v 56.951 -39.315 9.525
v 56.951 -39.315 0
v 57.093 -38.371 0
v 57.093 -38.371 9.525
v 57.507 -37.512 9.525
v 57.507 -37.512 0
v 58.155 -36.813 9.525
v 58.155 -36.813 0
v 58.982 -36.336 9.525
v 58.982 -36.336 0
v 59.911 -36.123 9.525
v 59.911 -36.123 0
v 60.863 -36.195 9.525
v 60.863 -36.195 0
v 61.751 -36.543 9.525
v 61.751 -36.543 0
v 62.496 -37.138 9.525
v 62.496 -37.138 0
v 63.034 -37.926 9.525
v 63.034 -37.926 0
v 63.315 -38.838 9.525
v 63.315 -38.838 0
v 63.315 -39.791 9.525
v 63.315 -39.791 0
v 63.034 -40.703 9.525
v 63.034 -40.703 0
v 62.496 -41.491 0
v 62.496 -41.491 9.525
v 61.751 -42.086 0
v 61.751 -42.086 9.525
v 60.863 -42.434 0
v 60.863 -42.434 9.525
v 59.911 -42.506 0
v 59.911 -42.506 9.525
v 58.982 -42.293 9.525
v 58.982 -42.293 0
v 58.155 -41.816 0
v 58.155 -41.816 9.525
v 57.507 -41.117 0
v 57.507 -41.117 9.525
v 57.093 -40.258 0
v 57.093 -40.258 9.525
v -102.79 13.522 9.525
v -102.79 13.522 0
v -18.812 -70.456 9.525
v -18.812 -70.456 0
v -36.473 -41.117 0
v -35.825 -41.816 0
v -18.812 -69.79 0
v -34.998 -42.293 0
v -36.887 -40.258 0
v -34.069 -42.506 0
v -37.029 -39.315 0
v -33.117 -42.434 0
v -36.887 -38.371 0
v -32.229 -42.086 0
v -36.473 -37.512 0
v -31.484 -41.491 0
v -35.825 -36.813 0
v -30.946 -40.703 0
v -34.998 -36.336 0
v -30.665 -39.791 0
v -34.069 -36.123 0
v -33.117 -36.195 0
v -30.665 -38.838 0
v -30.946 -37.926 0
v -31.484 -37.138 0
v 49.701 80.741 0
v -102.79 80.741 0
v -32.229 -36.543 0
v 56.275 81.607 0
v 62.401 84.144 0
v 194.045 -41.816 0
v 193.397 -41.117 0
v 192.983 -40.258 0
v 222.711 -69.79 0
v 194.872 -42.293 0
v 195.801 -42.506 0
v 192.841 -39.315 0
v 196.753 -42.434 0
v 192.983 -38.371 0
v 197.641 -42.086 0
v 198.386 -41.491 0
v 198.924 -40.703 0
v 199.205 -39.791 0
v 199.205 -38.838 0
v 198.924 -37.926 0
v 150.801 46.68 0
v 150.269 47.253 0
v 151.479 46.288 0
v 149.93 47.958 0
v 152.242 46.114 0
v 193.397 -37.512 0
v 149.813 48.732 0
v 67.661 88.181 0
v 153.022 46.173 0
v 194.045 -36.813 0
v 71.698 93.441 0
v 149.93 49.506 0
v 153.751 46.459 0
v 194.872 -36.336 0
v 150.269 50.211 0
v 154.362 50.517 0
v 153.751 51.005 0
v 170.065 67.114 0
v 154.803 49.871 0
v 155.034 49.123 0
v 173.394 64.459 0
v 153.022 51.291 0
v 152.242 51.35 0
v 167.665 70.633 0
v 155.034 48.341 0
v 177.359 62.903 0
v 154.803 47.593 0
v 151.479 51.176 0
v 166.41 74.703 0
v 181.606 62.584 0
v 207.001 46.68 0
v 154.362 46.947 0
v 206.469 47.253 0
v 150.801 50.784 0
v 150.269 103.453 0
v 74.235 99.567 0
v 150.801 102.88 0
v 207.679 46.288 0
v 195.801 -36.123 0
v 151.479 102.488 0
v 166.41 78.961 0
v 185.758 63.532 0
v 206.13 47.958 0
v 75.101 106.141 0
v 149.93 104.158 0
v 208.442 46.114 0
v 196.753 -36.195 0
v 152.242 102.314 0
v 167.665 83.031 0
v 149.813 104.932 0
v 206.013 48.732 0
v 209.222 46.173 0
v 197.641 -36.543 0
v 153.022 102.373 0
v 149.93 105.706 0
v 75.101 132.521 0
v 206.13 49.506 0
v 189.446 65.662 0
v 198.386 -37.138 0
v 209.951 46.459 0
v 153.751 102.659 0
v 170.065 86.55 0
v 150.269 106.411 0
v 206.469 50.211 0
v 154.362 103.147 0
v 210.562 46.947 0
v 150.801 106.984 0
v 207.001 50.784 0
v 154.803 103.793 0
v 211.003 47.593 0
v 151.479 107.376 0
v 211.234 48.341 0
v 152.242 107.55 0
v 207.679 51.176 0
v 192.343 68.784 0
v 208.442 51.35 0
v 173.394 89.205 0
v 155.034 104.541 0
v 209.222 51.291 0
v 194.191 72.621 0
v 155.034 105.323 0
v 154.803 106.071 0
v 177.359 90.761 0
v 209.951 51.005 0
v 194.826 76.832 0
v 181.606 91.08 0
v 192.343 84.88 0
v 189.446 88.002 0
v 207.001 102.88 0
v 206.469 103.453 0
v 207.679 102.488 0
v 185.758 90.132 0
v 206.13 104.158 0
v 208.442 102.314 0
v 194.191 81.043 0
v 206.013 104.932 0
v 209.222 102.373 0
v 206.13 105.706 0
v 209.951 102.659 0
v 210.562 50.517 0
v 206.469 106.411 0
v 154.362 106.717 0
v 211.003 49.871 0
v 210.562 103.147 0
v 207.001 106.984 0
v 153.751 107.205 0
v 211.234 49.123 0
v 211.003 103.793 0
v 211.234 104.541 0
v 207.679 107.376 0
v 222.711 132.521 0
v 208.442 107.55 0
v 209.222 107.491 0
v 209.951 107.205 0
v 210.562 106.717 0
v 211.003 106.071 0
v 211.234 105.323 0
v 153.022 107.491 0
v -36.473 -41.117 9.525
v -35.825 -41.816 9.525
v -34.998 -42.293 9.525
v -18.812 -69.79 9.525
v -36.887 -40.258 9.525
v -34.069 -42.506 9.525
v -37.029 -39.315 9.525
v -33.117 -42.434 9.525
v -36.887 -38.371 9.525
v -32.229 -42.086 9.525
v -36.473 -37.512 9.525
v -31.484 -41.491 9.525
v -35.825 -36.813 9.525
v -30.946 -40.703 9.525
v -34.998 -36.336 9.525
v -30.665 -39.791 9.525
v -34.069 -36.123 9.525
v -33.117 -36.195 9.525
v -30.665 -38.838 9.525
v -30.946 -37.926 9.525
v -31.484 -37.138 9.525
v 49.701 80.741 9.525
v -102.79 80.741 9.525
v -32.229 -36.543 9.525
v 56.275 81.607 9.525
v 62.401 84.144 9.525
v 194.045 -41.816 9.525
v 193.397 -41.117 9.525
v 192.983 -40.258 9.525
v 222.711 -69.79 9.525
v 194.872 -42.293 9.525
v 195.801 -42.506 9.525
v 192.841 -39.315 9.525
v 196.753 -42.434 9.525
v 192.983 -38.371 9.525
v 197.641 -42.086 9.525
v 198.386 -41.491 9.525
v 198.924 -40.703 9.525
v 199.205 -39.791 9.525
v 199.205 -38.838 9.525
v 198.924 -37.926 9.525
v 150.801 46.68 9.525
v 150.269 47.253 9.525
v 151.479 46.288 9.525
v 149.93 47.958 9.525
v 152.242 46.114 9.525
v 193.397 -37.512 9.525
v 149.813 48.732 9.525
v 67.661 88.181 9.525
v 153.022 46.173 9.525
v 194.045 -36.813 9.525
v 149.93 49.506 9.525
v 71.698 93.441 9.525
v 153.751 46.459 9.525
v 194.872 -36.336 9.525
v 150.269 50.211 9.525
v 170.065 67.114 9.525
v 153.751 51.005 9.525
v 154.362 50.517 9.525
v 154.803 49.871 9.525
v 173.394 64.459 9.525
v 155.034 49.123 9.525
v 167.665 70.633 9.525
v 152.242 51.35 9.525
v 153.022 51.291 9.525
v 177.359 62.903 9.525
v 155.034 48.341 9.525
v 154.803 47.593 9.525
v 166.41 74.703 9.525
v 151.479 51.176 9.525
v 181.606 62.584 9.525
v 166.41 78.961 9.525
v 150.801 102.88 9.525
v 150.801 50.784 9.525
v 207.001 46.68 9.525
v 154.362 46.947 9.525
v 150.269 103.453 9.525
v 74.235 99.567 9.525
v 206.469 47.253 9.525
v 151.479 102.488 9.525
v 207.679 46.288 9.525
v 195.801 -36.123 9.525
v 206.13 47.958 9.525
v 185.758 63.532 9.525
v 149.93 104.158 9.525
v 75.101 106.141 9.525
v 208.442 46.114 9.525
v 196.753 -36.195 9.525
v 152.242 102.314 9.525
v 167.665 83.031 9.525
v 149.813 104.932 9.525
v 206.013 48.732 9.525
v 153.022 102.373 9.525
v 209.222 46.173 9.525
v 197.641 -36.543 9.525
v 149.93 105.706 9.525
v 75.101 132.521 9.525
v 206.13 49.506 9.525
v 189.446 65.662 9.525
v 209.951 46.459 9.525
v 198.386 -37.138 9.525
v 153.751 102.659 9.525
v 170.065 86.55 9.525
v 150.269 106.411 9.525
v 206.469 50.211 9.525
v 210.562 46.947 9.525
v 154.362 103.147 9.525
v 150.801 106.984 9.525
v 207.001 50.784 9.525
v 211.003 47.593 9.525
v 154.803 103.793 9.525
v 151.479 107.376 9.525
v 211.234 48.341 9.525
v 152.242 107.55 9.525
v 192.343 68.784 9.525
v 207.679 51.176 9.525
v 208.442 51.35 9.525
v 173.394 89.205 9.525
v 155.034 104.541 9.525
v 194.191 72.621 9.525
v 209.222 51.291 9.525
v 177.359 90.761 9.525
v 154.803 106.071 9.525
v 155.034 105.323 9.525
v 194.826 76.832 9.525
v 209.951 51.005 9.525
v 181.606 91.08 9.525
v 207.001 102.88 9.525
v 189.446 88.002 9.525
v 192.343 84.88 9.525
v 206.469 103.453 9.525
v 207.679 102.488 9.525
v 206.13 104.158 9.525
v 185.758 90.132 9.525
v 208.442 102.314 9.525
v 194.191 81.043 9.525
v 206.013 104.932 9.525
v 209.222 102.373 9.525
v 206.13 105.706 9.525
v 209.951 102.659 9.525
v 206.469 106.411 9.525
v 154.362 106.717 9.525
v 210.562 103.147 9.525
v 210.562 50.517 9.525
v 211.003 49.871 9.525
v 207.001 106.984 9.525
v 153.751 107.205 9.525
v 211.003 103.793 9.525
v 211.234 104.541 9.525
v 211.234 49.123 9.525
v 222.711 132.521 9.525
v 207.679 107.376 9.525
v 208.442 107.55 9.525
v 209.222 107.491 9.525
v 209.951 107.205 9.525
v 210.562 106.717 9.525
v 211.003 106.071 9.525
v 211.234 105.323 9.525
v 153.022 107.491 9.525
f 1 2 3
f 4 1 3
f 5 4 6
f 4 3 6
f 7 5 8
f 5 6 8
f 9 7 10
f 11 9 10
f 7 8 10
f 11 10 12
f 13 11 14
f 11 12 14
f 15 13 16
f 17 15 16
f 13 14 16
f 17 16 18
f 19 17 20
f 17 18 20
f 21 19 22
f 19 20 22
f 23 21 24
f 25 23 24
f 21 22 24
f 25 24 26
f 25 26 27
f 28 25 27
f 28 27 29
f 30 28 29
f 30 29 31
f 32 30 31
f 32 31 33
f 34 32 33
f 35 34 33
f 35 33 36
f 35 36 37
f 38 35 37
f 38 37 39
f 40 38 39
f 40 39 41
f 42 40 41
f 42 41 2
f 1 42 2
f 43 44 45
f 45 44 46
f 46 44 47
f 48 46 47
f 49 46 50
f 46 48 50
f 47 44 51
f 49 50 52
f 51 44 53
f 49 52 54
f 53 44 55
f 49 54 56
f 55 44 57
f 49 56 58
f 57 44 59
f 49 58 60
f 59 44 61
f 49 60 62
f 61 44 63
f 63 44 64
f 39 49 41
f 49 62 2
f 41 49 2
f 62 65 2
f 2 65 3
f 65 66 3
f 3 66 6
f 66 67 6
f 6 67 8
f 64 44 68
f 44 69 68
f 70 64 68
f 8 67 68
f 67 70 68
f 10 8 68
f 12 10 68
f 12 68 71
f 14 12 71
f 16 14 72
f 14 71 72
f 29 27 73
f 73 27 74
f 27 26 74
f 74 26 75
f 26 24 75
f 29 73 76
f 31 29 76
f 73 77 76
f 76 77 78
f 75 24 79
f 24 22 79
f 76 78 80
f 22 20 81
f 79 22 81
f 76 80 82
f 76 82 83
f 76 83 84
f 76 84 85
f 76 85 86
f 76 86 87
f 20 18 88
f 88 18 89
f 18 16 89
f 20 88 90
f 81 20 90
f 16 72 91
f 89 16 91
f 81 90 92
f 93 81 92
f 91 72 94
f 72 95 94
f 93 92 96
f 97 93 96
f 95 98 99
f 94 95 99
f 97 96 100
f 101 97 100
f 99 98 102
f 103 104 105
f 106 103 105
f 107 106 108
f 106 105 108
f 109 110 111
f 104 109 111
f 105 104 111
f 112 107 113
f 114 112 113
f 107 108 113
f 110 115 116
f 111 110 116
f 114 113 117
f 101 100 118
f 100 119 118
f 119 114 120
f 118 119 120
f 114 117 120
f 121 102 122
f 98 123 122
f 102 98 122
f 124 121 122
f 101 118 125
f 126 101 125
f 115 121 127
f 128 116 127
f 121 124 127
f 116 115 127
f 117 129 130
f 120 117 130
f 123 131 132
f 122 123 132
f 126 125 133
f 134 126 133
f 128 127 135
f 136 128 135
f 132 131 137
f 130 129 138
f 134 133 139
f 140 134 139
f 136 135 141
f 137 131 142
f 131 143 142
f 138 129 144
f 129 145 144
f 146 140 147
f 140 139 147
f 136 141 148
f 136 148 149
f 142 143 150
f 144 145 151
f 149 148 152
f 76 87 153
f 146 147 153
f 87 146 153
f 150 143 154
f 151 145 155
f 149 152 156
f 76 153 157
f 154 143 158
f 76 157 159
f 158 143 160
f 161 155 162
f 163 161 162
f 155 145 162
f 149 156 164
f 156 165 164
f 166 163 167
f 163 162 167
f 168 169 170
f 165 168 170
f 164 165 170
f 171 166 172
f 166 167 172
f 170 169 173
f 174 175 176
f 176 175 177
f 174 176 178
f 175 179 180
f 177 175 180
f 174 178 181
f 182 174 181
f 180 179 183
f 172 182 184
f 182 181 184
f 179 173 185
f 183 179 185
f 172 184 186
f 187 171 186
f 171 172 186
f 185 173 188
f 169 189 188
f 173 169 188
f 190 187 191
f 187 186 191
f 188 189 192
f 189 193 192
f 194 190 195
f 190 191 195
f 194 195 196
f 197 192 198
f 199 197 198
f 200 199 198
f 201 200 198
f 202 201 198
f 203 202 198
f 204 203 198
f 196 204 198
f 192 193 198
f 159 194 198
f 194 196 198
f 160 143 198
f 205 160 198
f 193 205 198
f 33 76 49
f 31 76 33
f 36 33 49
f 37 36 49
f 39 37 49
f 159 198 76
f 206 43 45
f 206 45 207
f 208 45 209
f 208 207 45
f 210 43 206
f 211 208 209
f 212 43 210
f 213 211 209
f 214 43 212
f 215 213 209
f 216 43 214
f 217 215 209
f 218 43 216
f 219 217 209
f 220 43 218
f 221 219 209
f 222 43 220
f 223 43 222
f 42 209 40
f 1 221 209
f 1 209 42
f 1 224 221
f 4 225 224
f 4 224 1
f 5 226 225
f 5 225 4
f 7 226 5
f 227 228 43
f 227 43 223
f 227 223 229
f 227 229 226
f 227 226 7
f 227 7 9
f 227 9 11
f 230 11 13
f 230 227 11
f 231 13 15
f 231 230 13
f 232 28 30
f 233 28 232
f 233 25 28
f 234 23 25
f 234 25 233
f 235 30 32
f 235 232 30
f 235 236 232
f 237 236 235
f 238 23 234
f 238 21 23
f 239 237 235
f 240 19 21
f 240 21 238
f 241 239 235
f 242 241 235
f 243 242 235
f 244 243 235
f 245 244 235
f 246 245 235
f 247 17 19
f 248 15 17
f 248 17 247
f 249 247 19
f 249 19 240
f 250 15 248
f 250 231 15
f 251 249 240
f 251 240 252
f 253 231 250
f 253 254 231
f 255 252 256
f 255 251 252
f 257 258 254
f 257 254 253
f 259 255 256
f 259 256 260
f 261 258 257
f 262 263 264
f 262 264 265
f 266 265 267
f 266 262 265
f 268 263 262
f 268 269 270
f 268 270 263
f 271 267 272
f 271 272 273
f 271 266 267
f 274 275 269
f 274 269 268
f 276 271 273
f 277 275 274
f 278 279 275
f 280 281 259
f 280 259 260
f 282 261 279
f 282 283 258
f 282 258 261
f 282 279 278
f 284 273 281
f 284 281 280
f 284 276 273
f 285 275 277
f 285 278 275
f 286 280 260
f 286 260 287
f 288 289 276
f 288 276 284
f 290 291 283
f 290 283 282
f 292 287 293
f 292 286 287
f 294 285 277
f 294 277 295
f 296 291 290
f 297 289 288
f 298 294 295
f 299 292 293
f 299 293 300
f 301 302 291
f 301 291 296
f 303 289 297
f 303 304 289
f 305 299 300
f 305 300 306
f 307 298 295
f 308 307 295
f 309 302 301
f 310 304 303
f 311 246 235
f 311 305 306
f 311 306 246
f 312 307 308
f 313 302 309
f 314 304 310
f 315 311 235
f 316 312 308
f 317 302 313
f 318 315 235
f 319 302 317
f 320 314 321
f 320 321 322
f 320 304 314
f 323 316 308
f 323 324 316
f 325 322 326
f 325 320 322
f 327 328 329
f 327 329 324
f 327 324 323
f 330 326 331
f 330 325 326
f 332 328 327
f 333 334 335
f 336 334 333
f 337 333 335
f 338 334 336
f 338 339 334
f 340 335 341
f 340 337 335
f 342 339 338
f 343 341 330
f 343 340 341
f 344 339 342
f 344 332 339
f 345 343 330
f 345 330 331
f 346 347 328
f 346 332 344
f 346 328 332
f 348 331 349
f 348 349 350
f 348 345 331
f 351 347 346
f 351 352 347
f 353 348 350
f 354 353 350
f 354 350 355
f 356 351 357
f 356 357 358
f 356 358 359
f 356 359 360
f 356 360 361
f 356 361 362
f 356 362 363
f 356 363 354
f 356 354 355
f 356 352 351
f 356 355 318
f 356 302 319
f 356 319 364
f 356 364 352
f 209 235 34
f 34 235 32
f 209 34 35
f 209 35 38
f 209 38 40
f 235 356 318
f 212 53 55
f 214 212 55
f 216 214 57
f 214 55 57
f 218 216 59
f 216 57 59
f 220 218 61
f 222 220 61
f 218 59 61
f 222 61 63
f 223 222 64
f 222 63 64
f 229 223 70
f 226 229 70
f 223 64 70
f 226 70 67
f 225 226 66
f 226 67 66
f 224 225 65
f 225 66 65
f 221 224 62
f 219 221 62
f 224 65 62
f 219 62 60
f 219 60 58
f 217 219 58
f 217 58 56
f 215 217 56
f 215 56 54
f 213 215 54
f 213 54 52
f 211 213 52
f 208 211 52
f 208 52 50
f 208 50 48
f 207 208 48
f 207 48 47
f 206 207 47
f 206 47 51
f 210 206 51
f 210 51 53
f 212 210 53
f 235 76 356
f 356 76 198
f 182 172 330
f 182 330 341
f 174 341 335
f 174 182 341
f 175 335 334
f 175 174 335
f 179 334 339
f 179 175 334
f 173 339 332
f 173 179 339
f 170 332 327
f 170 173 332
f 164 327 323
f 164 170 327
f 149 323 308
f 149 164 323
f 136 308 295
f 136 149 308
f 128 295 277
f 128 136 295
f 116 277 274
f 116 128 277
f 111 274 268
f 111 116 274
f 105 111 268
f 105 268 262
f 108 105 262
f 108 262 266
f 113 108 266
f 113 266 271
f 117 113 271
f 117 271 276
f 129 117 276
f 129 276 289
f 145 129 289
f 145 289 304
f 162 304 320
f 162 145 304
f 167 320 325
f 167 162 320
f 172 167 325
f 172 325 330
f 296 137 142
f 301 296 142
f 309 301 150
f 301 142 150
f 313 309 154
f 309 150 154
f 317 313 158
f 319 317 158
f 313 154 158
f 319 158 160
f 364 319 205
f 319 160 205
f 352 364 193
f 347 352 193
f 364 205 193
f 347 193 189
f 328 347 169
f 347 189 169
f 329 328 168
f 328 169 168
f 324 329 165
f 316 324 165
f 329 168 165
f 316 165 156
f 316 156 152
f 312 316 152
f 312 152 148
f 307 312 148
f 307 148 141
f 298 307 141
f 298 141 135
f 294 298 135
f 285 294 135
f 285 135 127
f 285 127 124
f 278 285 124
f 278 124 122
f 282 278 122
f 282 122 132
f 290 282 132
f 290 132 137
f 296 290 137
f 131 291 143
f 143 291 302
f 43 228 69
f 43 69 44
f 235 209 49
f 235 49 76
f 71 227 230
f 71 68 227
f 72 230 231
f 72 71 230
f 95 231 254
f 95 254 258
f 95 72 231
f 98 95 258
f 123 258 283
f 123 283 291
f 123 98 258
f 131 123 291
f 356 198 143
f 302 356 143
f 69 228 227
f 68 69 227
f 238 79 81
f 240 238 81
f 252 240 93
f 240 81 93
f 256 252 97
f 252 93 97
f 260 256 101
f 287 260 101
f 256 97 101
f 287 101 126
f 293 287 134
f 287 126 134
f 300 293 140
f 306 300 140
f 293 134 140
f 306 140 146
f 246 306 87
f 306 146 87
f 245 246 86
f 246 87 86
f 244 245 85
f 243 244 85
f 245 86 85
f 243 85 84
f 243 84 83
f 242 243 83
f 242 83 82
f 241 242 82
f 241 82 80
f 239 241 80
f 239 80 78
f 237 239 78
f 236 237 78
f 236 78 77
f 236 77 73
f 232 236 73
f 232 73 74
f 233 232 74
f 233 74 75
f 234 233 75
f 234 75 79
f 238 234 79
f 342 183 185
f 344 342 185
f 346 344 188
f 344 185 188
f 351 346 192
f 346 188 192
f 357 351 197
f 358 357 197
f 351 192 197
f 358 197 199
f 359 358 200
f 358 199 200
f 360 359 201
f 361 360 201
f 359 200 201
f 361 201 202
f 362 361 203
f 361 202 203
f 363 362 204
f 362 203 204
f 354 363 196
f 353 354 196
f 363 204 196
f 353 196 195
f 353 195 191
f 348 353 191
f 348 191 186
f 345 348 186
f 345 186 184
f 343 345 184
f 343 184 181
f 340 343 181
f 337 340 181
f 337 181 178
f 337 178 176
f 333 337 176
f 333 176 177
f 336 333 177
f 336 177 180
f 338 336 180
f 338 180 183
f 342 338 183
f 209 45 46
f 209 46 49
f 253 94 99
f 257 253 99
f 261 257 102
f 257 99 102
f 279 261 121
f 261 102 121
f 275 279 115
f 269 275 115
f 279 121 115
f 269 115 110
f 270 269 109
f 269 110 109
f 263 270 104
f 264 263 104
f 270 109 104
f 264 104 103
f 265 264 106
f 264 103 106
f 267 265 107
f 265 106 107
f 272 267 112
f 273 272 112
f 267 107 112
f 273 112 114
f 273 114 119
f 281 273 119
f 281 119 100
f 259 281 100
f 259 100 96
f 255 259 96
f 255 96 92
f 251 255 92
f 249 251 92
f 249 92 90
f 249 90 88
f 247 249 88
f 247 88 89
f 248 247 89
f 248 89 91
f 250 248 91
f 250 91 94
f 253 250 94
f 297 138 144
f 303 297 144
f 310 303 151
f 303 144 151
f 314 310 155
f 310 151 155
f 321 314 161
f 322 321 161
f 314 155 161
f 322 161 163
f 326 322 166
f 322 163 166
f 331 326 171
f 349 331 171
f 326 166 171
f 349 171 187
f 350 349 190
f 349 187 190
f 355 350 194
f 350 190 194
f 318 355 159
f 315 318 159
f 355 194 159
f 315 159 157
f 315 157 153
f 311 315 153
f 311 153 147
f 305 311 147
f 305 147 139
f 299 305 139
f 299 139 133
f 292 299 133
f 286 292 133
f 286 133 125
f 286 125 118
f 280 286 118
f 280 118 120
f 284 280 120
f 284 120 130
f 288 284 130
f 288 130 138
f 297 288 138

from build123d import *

# Parameters (mm, degrees)
SKETCH1_R                    = 14.2875
BOSS_EXTRUDE1_DEPTH          = 9.525
SKETCH2_W                    = 260.572878056
SKETCH2_H                    = 51.689000001
CUT_EXTRUDE1_DEPTH           = 10.525
SKETCH4_W                    = 213.36
SKETCH4_H                    = 68.767352002
CUT_EXTRUDE2_DEPTH           = 10.525
FILLET2_R                    = 25.4
SKETCH16_W                   = 9.525
SKETCH16_H                   = 4.28736328
CUT_EXTRUDE3_DEPTH           = 361.970011278
SKETCH17_W                   = 147.610011278
SKETCH17_H                   = 12.7
CUT_EXTRUDE4_DEPTH           = 10.525
TAP_DRILL_FOR_M6X0_75_TAP1_D = 5.25
F_6_4_6_4_DIAMETER_HOLE1_D   = 6.4
CUT_EXTRUDE5_DEPTH           = 10.525


with BuildPart() as part:
    # Sketch1 → Boss-Extrude1 (new body)
    with BuildSketch(Plane.XY):
        Polygon((-138.259383474, 48.991487021), (32.210627804, -121.478524257), (222.710627804, -121.478524257), (222.710627804, 149.508839023), (-138.259383474, 149.508839023), align=None)
        with Locations((180.538014078, 76.831975743)):
            Circle(SKETCH1_R, mode=Mode.SUBTRACT)
    extrude(amount=BOSS_EXTRUDE1_DEPTH)

    # Sketch2 → Cut-Extrude1 (cut, through all)
    with BuildSketch(Plane.XY.offset(9.525)):
        with Locations((111.474188776, -95.634024256)):
            Rectangle(SKETCH2_W, SKETCH2_H)
    extrude(amount=-CUT_EXTRUDE1_DEPTH, mode=Mode.SUBTRACT)

    # Sketch4 → Cut-Extrude2 (cut, through all)
    with BuildSketch(Plane.XY.offset(9.525)):
        with Locations((-31.579383474, 115.125163022)):
            Rectangle(SKETCH4_W, SKETCH4_H)
    extrude(amount=-CUT_EXTRUDE2_DEPTH, mode=Mode.SUBTRACT)

    # Fillet2
    fillet2_edges = [part.edges().sort_by_distance(p)[0] for p in [
        (-138.259383474, 80.741487021, 4.7625),
        (75.100616526, 80.741487021, 4.7625),
    ]]
    fillet(fillet2_edges, radius=FILLET2_R)

    # Sketch16 → Cut-Extrude3 (cut, through all)
    with BuildSketch(Plane(origin=(222.710627804, 0, 0), x_dir=(0, 0, -1), z_dir=(1, 0, 0))):
        with Locations((-4.7625, 147.365157383)):
            Rectangle(SKETCH16_W, SKETCH16_H)
    extrude(amount=-CUT_EXTRUDE3_DEPTH, mode=Mode.SUBTRACT)

    # Sketch17 → Cut-Extrude4 (cut, through all)
    with BuildSketch(Plane(origin=(0, 0, 0), x_dir=(-1, 0, 0), z_dir=(0, 0, -1))):
        with Locations((-148.905622165, 138.871475743)):
            Rectangle(SKETCH17_W, SKETCH17_H)
    extrude(amount=-CUT_EXTRUDE4_DEPTH, mode=Mode.SUBTRACT)

    # Tap Drill for M6x0.75 Tap1 (through all)
    with Locations(Plane.XY.offset(9.525)):
        with Locations((208.638014078, 104.931975743), (152.438014078, 104.931975743), (152.438014078, 48.731975743), (208.638014078, 48.731975743)):
            Hole(TAP_DRILL_FOR_M6X0_75_TAP1_D / 2)

    # Ø6.4 (6.4) Diameter Hole1 (through all)
    with Locations(Plane.XY.offset(9.525)):
        with Locations((196.040627804, -39.314524257), (60.150627804, -39.314524257), (-33.829372196, -39.314524257)):
            Hole(F_6_4_6_4_DIAMETER_HOLE1_D / 2)

    # Sketch22 → Cut-Extrude5 (cut, through all)
    with BuildSketch(Plane.XY.offset(9.525)):
        Polygon((-102.790372196, 145.085482826), (-102.790372196, -100.339530139), (-209.67575658, -95.573995907), (-209.67575658, 145.085482826), align=None)
    extrude(amount=-CUT_EXTRUDE5_DEPTH, mode=Mode.SUBTRACT)


solid = part.part
